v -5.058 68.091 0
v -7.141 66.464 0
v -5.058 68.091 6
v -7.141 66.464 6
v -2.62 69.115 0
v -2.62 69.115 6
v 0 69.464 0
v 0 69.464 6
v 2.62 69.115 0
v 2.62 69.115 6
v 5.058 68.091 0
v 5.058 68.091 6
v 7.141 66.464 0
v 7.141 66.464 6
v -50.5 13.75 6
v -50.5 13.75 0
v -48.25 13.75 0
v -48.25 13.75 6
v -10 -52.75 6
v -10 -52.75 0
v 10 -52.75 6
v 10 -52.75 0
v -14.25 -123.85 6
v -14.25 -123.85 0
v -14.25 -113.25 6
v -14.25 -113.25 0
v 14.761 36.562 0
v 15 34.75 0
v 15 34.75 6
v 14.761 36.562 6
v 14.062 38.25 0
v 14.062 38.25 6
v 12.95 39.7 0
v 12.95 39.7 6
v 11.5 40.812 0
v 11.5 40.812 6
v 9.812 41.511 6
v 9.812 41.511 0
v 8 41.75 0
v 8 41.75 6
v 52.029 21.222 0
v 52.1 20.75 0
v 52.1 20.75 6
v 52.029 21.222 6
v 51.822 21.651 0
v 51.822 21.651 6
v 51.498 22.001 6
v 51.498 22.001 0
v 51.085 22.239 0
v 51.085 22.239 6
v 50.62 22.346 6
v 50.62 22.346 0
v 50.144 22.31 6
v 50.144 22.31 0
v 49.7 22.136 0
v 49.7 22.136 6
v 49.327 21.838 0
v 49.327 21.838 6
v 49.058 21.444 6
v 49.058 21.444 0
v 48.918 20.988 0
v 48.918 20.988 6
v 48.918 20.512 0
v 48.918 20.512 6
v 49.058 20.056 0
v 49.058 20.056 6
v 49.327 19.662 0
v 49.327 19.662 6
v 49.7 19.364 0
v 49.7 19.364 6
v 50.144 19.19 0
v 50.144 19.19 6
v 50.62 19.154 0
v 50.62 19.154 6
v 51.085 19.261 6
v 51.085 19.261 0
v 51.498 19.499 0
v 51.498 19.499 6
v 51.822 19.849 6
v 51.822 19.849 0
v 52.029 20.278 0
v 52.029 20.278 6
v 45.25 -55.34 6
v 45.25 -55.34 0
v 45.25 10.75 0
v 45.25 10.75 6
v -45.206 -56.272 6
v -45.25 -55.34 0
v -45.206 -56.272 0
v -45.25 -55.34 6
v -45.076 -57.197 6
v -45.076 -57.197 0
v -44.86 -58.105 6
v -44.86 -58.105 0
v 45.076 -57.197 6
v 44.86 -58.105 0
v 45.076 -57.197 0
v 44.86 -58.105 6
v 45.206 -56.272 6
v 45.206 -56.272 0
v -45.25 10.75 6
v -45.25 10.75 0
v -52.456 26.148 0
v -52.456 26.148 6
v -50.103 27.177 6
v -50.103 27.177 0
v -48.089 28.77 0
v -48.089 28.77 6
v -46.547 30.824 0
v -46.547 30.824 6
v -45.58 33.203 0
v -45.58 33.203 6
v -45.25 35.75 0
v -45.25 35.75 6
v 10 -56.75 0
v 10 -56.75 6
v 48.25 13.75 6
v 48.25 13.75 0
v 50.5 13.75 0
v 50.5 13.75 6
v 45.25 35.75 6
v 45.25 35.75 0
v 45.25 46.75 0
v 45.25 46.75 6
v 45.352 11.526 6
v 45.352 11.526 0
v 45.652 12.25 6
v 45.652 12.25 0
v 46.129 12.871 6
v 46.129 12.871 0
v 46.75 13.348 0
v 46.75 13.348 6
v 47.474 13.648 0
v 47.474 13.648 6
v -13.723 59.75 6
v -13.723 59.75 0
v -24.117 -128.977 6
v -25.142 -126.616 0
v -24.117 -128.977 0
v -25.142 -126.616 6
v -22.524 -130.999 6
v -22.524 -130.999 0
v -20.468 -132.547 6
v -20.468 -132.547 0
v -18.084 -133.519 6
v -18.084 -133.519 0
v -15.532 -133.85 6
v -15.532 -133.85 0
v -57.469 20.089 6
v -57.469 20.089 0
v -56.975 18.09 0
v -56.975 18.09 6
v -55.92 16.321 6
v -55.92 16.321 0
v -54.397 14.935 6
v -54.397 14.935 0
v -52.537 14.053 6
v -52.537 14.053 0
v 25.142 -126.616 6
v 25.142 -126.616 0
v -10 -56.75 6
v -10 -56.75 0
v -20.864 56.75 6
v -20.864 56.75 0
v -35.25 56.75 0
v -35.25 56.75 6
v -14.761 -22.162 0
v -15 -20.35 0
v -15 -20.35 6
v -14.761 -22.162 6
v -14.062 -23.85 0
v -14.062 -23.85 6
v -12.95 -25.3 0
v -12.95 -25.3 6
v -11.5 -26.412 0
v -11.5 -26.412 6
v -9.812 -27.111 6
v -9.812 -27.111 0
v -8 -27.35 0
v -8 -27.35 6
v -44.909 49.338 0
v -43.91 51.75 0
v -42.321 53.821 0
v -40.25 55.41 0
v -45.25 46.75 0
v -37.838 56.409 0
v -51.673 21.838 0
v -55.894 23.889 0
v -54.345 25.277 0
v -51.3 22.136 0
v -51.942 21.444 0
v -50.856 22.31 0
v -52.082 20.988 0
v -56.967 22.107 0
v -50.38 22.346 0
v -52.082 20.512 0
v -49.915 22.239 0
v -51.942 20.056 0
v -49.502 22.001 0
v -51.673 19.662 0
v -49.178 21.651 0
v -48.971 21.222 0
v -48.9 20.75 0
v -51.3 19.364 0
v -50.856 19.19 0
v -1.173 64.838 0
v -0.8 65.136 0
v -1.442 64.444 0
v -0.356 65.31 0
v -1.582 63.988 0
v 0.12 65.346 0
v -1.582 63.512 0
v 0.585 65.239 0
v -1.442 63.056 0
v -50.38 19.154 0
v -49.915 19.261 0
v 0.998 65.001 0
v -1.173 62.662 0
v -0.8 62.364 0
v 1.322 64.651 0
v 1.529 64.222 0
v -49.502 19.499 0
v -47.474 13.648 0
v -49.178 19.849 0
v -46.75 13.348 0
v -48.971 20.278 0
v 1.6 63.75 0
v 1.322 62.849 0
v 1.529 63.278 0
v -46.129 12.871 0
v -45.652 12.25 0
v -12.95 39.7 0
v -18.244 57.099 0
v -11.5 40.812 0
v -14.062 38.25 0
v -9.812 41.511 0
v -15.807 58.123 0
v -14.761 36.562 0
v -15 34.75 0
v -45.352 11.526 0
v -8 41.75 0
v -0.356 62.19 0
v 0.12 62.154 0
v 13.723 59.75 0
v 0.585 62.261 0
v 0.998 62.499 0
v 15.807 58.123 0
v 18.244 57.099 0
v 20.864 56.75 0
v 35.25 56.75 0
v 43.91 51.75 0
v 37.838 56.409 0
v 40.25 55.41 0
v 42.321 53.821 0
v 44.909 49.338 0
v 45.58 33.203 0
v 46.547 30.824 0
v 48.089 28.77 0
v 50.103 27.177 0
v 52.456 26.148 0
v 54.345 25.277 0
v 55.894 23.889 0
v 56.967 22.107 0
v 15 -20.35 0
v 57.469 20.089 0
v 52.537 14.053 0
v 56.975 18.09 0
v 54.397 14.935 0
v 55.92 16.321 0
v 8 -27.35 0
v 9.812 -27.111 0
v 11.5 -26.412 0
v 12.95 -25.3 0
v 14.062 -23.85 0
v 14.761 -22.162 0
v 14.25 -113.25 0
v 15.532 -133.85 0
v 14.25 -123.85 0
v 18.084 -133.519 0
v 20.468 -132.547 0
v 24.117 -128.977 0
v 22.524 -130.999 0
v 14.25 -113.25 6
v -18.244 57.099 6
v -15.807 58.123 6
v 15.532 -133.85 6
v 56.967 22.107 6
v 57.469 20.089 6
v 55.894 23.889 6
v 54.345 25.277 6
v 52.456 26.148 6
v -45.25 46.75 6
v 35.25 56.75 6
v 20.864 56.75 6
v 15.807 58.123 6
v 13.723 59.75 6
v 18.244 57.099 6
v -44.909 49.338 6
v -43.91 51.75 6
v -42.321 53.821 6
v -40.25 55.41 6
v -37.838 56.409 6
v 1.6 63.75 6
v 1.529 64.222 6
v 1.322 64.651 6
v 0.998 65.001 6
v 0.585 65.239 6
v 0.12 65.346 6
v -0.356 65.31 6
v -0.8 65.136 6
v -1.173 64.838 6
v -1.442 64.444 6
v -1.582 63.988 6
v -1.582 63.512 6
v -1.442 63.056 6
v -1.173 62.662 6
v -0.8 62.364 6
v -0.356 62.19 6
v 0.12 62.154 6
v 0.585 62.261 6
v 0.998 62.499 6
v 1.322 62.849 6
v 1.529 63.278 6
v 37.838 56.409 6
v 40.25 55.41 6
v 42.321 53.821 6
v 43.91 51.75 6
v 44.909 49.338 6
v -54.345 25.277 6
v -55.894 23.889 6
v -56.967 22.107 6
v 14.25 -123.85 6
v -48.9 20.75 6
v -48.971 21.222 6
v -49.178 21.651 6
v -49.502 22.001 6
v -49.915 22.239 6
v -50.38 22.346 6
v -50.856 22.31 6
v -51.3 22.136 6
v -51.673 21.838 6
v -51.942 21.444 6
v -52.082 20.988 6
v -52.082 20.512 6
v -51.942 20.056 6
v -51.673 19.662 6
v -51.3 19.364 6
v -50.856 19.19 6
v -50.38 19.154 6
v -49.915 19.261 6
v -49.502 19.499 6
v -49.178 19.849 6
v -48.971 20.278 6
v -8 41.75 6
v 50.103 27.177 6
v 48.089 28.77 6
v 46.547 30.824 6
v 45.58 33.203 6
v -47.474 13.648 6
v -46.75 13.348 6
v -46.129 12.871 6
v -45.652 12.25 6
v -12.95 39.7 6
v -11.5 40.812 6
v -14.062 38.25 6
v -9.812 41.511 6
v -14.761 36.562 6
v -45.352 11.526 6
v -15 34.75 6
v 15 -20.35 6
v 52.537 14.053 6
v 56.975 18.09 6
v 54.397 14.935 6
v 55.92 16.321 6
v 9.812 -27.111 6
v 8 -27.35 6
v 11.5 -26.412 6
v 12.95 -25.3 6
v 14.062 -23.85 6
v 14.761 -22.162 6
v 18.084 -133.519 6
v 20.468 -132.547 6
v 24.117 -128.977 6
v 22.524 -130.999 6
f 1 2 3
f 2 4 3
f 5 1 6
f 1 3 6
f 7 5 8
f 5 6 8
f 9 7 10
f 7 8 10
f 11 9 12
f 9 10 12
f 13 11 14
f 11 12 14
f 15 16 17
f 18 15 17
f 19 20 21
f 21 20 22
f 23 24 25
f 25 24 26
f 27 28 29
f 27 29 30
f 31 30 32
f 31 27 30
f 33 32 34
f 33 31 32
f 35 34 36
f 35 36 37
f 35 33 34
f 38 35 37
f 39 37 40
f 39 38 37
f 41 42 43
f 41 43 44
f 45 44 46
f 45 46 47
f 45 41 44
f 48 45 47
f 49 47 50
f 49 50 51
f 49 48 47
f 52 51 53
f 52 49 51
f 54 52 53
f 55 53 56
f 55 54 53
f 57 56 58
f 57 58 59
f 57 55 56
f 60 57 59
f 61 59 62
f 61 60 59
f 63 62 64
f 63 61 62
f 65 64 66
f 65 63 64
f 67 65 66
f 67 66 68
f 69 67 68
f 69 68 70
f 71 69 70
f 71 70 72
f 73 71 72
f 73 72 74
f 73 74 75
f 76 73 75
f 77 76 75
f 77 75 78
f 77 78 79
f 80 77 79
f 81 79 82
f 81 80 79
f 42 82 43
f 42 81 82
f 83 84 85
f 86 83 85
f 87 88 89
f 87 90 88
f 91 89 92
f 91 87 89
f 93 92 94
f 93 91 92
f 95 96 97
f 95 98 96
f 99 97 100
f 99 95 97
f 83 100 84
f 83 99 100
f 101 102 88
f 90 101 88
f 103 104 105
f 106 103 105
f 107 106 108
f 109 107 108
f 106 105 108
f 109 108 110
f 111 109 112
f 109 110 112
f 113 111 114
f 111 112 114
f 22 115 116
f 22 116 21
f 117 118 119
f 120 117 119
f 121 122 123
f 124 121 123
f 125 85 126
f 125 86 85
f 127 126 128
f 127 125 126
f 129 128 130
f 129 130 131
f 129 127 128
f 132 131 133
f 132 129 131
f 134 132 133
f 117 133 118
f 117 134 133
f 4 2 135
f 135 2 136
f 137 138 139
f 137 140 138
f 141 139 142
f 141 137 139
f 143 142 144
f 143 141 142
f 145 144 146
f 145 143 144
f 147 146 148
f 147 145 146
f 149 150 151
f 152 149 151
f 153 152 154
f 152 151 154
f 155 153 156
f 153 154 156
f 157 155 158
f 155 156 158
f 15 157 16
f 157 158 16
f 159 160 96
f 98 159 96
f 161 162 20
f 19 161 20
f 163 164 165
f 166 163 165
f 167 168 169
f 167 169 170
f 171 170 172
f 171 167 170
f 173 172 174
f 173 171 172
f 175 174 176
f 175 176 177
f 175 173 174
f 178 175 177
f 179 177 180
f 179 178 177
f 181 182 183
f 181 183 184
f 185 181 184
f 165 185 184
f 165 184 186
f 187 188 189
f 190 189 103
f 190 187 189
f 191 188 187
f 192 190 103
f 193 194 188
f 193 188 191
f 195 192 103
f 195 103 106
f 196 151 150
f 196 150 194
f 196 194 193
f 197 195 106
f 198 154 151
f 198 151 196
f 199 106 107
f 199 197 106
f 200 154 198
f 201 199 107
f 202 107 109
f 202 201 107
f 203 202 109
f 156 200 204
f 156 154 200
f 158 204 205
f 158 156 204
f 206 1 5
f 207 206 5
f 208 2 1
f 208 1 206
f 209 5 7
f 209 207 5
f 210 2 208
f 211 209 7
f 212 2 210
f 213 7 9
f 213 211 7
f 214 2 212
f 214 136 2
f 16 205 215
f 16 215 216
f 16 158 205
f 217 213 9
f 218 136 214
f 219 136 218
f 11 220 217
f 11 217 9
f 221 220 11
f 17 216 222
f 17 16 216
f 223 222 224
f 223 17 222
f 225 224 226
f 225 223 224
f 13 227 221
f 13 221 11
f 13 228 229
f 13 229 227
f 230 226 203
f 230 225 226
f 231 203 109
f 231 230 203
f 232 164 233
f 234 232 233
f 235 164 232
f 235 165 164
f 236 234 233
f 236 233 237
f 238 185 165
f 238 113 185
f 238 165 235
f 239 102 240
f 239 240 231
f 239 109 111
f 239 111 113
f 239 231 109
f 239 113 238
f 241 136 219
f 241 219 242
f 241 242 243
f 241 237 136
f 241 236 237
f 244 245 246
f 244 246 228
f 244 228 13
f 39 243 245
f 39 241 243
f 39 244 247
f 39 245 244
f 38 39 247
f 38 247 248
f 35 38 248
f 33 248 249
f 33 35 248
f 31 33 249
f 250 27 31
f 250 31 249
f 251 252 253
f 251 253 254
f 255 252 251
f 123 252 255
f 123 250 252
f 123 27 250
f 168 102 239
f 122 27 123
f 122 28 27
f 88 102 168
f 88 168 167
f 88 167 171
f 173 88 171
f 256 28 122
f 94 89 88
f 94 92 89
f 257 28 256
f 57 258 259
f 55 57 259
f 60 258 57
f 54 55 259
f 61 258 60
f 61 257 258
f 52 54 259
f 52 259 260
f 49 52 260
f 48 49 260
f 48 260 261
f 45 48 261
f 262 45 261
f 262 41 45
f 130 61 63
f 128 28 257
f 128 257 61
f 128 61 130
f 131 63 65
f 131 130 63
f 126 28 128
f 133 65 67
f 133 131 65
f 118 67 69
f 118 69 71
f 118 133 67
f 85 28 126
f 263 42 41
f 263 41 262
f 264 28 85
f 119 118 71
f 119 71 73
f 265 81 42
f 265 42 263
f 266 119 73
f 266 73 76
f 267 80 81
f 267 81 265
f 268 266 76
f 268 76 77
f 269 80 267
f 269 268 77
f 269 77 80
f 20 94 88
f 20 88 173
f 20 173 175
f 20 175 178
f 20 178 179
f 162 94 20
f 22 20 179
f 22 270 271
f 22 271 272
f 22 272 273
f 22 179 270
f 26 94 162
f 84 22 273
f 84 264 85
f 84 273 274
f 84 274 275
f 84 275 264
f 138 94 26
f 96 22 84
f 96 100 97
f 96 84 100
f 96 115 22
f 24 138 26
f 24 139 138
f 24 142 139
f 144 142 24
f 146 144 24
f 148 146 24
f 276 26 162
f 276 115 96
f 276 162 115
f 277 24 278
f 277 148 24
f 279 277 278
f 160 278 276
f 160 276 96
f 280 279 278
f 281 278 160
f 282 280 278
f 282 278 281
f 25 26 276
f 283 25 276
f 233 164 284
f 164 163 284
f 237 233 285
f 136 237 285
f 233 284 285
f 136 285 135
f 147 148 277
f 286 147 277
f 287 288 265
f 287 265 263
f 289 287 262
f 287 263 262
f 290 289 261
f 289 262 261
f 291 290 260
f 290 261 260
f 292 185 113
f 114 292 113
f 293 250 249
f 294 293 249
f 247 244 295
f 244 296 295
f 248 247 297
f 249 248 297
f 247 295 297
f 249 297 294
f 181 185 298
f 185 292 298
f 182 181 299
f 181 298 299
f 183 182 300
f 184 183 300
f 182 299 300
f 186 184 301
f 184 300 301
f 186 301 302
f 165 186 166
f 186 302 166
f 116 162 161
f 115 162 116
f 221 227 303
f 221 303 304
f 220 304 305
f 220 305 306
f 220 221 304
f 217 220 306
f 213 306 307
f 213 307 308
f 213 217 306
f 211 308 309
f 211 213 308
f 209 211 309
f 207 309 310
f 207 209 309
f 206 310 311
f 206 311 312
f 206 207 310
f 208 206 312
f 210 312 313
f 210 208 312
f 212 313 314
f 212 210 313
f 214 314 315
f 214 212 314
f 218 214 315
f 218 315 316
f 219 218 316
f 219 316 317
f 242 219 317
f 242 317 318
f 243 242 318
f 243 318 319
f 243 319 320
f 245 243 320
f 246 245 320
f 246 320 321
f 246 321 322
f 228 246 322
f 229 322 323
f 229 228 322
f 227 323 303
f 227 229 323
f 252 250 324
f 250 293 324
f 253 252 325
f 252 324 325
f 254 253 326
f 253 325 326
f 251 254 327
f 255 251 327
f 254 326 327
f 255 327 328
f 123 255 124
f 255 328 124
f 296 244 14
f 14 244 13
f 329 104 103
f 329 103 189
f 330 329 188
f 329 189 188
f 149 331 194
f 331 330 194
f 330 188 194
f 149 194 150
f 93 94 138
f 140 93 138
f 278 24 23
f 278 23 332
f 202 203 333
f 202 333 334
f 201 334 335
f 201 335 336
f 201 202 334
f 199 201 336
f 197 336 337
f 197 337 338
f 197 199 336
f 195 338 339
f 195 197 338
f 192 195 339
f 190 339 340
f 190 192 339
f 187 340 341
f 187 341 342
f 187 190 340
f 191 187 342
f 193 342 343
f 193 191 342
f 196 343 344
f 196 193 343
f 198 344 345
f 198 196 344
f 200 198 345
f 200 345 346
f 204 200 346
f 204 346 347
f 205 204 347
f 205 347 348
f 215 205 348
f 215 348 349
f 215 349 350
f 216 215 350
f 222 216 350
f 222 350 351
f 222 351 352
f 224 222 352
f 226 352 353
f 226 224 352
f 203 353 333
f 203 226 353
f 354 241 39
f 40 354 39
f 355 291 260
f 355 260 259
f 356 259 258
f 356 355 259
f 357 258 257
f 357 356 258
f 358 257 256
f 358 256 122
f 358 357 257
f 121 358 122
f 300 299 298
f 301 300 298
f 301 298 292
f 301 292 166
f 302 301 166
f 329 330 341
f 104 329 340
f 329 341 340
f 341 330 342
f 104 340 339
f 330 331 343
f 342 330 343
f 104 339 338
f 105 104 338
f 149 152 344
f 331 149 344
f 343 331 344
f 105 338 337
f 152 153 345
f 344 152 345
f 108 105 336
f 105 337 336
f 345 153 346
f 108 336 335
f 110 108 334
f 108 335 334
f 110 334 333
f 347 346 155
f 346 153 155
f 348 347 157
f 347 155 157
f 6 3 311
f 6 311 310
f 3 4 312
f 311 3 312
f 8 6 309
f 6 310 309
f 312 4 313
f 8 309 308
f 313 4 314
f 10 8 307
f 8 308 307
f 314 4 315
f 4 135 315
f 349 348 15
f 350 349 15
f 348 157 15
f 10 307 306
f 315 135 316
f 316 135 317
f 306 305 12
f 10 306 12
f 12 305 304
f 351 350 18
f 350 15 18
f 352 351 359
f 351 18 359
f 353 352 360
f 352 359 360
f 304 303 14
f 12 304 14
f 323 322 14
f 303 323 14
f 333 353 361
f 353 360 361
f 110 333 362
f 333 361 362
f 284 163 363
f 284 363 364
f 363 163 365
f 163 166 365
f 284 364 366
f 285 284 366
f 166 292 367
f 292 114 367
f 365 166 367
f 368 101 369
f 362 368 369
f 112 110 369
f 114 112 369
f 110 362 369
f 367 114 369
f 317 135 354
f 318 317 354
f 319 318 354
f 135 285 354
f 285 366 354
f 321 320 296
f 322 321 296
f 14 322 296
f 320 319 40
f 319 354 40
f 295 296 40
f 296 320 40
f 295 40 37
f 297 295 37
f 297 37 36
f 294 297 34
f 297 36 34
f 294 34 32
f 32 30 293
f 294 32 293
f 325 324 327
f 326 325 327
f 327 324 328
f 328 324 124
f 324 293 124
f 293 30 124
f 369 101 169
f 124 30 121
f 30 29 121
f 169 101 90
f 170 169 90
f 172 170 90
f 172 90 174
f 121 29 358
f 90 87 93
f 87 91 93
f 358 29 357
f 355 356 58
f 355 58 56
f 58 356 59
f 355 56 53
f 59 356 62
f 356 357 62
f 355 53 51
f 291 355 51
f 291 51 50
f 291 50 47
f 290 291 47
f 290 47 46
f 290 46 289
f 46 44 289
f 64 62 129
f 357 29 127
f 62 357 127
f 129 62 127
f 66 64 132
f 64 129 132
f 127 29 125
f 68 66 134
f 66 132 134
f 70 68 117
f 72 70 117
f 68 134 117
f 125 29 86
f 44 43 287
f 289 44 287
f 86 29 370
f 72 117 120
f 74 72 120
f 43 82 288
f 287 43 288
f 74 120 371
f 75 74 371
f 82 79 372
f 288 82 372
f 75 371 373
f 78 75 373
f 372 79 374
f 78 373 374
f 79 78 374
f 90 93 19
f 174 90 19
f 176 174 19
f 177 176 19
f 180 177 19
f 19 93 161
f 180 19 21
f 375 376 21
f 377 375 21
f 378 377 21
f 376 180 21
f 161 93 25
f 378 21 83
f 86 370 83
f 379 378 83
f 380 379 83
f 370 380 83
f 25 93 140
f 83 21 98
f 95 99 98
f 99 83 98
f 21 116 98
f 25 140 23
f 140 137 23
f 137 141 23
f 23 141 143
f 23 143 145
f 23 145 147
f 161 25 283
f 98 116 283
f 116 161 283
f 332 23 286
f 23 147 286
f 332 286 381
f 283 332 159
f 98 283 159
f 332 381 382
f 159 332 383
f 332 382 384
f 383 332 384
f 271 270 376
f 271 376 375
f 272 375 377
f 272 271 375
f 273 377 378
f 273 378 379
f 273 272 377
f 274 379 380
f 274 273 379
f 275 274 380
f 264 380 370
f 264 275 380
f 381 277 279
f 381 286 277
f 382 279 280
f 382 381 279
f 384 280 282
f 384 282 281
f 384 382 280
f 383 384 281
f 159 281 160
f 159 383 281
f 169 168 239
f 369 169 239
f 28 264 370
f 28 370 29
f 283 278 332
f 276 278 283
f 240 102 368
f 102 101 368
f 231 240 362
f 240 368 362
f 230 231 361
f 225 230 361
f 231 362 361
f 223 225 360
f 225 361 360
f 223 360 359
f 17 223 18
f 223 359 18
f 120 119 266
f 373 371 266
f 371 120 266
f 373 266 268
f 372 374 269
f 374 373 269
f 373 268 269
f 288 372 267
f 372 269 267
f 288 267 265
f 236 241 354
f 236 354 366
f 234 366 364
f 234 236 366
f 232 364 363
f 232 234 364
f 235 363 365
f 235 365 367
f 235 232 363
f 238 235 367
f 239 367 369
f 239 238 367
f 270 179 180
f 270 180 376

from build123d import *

# Parameters (mm, degrees)
ESBO_O1_R                = 1.6
ESBO_O1_W                = 28.5
ESBO_O1_H                = 10.6
ESBO_O1_W_2              = 30
ESBO_O1_H_2              = 69.1
ESBO_O1_W_3              = 20
ESBO_O1_H_3              = 4
RESSALTO_EXTRUS_O1_DEPTH = 6
FILETE3_R                = 3
FILETE4_R                = 10
FILETE5_R                = 7


with BuildPart() as part:
    # Esboço1 → Ressalto-extrusão1 (new body)
    with BuildSketch(Plane.XY):
        Polygon((-45.25, -56.75), (-23.05952475, -133.85), (23.05952475, -133.85), (45.25, -56.75), (45.25, 13.75), (57.5, 13.75), (57.5, 25.75), (45.25, 25.75), (45.25, 56.75), (16.663333, 56.75), (0, 73.75), (-16.663333, 56.75), (-45.25, 56.75), (-45.25, 25.75), (-57.5, 25.75), (-57.5, 13.75), (-45.25, 13.75), align=None)
        with Locations((0, 63.75)):
            Circle(ESBO_O1_R, mode=Mode.SUBTRACT)
        with Locations((-50.5, 20.75)):
            Circle(ESBO_O1_R, mode=Mode.SUBTRACT)
        with Locations((50.5, 20.75)):
            Circle(ESBO_O1_R, mode=Mode.SUBTRACT)
        with Locations((0, -118.55)):
            Rectangle(ESBO_O1_W, ESBO_O1_H, mode=Mode.SUBTRACT)
        with Locations((0, 7.2)):
            Rectangle(ESBO_O1_W_2, ESBO_O1_H_2, mode=Mode.SUBTRACT)
        with Locations((0, -54.75)):
            Rectangle(ESBO_O1_W_3, ESBO_O1_H_3, mode=Mode.SUBTRACT)
    extrude(amount=RESSALTO_EXTRUS_O1_DEPTH)

    # Filete3
    filete3_edges = [part.edges().sort_by_distance(p)[0] for p in [
        (-45.25, 13.75, 3),
        (45.25, 13.75, 3),
    ]]
    fillet(filete3_edges, radius=FILETE3_R)

    # Filete4
    filete4_edges = [part.edges().sort_by_distance(p)[0] for p in [
        (-45.25, 25.75, 3),
        (-45.25, 56.75, 3),
        (-16.663333, 56.75, 3),
        (0, 73.75, 3),
        (16.663333, 56.75, 3),
        (45.25, 56.75, 3),
        (45.25, 25.75, 3),
        (45.25, -56.75, 3),
        (23.05952475, -133.85, 3),
        (-23.05952475, -133.85, 3),
        (-45.25, -56.75, 3),
    ]]
    fillet(filete4_edges, radius=FILETE4_R)

    # Filete5
    # the kernel refuses this fillet: 7 mm, written as the material it adds along each edge
    with BuildSketch(Plane(origin=(-15, -27.35, 0), x_dir=(1, 0, 0), z_dir=(0, 0, 1)), Plane(origin=(15, 41.75, 0), x_dir=(-1, 0, 0), z_dir=(0, 0, 1)), Plane(origin=(-15, 41.75, 0), x_dir=(0, -1, 0), z_dir=(0, 0, 1))) as filete5_piece_1:
        with BuildLine():
            CenterArc((FILETE5_R, FILETE5_R), FILETE5_R, 180, 90)
            Line((0, FILETE5_R), (0, 0))
            Line((0, 0), (FILETE5_R, 0))
        make_face()
    extrude(amount=6)
    with BuildSketch(Plane(origin=(15, -27.35, 0), x_dir=(-1, 0, 0), z_dir=(0, 0, 1))) as filete5_piece_2:
        with BuildLine():
            CenterArc((FILETE5_R, -FILETE5_R), FILETE5_R, 90, 90)
            Line((0, -FILETE5_R), (0, 0))
            Line((0, 0), (FILETE5_R, 0))
        make_face()
    extrude(amount=6)
    # the kernel refuses this fillet: 7 mm, written as the material it takes off along each edge
    with BuildSketch(Plane(origin=(57.5, 13.75, -17.5), x_dir=(-1, 0, 0), z_dir=(0, 0, 1))) as filete5_2_piece_1:
        with BuildLine():
            CenterArc((FILETE5_R, -FILETE5_R), FILETE5_R, 90, 90)
            Line((0, -FILETE5_R), (0, 0))
            Line((0, 0), (FILETE5_R, 0))
        make_face()
    extrude(amount=41, mode=Mode.SUBTRACT)
    with BuildSketch(Plane(origin=(57.5, 25.75, -15.807283357), x_dir=(0, -1, 0), z_dir=(0, 0, 1))) as filete5_2_piece_2:
        with BuildLine():
            CenterArc((6.322913343, -7), FILETE5_R, 90, 73.774899865)
            Line((-0.398286269, -5.044117647), (-1.07040623, -4.848529412))
            ThreePointArc((-1.07040623, -4.848529412), (-0.7, -2.25), (-0.7, 0))
            Line((-0.7, 0), (0, 0.7))
            Line((0, 0.7), (6.322913343, 0.7))
            Line((6.322913343, 0.7), (6.322913343, 0))
        make_face()
    extrude(amount=37.614566715, mode=Mode.SUBTRACT)
    with BuildSketch(Plane(origin=(-57.5, 13.75, -17.5), x_dir=(1, 0, 0), z_dir=(0, 0, 1))) as filete5_2_piece_3:
        with BuildLine():
            CenterArc((FILETE5_R, FILETE5_R), FILETE5_R, 180, 90)
            Line((0, FILETE5_R), (0, 0))
            Line((0, 0), (FILETE5_R, 0))
        make_face()
    extrude(amount=41, mode=Mode.SUBTRACT)
    with BuildSketch(Plane(origin=(-57.5, 25.75, -15.807283357), x_dir=(0, -1, 0), z_dir=(0, 0, 1))) as filete5_2_piece_4:
        with BuildLine():
            CenterArc((6.322913343, 7), FILETE5_R, 196.225100135, 73.774899865)
            Line((-0.398286269, 5.044117647), (-1.07040623, 4.848529412))
            ThreePointArc((-1.07040623, 4.848529412), (-0.7, 2.25), (-0.7, 0))
            Line((-0.7, 0), (0, -0.7))
            Line((0, -0.7), (6.322913343, -0.7))
            Line((6.322913343, -0.7), (6.322913343, 0))
        make_face()
    extrude(amount=37.614566715, mode=Mode.SUBTRACT)


solid = part.part
